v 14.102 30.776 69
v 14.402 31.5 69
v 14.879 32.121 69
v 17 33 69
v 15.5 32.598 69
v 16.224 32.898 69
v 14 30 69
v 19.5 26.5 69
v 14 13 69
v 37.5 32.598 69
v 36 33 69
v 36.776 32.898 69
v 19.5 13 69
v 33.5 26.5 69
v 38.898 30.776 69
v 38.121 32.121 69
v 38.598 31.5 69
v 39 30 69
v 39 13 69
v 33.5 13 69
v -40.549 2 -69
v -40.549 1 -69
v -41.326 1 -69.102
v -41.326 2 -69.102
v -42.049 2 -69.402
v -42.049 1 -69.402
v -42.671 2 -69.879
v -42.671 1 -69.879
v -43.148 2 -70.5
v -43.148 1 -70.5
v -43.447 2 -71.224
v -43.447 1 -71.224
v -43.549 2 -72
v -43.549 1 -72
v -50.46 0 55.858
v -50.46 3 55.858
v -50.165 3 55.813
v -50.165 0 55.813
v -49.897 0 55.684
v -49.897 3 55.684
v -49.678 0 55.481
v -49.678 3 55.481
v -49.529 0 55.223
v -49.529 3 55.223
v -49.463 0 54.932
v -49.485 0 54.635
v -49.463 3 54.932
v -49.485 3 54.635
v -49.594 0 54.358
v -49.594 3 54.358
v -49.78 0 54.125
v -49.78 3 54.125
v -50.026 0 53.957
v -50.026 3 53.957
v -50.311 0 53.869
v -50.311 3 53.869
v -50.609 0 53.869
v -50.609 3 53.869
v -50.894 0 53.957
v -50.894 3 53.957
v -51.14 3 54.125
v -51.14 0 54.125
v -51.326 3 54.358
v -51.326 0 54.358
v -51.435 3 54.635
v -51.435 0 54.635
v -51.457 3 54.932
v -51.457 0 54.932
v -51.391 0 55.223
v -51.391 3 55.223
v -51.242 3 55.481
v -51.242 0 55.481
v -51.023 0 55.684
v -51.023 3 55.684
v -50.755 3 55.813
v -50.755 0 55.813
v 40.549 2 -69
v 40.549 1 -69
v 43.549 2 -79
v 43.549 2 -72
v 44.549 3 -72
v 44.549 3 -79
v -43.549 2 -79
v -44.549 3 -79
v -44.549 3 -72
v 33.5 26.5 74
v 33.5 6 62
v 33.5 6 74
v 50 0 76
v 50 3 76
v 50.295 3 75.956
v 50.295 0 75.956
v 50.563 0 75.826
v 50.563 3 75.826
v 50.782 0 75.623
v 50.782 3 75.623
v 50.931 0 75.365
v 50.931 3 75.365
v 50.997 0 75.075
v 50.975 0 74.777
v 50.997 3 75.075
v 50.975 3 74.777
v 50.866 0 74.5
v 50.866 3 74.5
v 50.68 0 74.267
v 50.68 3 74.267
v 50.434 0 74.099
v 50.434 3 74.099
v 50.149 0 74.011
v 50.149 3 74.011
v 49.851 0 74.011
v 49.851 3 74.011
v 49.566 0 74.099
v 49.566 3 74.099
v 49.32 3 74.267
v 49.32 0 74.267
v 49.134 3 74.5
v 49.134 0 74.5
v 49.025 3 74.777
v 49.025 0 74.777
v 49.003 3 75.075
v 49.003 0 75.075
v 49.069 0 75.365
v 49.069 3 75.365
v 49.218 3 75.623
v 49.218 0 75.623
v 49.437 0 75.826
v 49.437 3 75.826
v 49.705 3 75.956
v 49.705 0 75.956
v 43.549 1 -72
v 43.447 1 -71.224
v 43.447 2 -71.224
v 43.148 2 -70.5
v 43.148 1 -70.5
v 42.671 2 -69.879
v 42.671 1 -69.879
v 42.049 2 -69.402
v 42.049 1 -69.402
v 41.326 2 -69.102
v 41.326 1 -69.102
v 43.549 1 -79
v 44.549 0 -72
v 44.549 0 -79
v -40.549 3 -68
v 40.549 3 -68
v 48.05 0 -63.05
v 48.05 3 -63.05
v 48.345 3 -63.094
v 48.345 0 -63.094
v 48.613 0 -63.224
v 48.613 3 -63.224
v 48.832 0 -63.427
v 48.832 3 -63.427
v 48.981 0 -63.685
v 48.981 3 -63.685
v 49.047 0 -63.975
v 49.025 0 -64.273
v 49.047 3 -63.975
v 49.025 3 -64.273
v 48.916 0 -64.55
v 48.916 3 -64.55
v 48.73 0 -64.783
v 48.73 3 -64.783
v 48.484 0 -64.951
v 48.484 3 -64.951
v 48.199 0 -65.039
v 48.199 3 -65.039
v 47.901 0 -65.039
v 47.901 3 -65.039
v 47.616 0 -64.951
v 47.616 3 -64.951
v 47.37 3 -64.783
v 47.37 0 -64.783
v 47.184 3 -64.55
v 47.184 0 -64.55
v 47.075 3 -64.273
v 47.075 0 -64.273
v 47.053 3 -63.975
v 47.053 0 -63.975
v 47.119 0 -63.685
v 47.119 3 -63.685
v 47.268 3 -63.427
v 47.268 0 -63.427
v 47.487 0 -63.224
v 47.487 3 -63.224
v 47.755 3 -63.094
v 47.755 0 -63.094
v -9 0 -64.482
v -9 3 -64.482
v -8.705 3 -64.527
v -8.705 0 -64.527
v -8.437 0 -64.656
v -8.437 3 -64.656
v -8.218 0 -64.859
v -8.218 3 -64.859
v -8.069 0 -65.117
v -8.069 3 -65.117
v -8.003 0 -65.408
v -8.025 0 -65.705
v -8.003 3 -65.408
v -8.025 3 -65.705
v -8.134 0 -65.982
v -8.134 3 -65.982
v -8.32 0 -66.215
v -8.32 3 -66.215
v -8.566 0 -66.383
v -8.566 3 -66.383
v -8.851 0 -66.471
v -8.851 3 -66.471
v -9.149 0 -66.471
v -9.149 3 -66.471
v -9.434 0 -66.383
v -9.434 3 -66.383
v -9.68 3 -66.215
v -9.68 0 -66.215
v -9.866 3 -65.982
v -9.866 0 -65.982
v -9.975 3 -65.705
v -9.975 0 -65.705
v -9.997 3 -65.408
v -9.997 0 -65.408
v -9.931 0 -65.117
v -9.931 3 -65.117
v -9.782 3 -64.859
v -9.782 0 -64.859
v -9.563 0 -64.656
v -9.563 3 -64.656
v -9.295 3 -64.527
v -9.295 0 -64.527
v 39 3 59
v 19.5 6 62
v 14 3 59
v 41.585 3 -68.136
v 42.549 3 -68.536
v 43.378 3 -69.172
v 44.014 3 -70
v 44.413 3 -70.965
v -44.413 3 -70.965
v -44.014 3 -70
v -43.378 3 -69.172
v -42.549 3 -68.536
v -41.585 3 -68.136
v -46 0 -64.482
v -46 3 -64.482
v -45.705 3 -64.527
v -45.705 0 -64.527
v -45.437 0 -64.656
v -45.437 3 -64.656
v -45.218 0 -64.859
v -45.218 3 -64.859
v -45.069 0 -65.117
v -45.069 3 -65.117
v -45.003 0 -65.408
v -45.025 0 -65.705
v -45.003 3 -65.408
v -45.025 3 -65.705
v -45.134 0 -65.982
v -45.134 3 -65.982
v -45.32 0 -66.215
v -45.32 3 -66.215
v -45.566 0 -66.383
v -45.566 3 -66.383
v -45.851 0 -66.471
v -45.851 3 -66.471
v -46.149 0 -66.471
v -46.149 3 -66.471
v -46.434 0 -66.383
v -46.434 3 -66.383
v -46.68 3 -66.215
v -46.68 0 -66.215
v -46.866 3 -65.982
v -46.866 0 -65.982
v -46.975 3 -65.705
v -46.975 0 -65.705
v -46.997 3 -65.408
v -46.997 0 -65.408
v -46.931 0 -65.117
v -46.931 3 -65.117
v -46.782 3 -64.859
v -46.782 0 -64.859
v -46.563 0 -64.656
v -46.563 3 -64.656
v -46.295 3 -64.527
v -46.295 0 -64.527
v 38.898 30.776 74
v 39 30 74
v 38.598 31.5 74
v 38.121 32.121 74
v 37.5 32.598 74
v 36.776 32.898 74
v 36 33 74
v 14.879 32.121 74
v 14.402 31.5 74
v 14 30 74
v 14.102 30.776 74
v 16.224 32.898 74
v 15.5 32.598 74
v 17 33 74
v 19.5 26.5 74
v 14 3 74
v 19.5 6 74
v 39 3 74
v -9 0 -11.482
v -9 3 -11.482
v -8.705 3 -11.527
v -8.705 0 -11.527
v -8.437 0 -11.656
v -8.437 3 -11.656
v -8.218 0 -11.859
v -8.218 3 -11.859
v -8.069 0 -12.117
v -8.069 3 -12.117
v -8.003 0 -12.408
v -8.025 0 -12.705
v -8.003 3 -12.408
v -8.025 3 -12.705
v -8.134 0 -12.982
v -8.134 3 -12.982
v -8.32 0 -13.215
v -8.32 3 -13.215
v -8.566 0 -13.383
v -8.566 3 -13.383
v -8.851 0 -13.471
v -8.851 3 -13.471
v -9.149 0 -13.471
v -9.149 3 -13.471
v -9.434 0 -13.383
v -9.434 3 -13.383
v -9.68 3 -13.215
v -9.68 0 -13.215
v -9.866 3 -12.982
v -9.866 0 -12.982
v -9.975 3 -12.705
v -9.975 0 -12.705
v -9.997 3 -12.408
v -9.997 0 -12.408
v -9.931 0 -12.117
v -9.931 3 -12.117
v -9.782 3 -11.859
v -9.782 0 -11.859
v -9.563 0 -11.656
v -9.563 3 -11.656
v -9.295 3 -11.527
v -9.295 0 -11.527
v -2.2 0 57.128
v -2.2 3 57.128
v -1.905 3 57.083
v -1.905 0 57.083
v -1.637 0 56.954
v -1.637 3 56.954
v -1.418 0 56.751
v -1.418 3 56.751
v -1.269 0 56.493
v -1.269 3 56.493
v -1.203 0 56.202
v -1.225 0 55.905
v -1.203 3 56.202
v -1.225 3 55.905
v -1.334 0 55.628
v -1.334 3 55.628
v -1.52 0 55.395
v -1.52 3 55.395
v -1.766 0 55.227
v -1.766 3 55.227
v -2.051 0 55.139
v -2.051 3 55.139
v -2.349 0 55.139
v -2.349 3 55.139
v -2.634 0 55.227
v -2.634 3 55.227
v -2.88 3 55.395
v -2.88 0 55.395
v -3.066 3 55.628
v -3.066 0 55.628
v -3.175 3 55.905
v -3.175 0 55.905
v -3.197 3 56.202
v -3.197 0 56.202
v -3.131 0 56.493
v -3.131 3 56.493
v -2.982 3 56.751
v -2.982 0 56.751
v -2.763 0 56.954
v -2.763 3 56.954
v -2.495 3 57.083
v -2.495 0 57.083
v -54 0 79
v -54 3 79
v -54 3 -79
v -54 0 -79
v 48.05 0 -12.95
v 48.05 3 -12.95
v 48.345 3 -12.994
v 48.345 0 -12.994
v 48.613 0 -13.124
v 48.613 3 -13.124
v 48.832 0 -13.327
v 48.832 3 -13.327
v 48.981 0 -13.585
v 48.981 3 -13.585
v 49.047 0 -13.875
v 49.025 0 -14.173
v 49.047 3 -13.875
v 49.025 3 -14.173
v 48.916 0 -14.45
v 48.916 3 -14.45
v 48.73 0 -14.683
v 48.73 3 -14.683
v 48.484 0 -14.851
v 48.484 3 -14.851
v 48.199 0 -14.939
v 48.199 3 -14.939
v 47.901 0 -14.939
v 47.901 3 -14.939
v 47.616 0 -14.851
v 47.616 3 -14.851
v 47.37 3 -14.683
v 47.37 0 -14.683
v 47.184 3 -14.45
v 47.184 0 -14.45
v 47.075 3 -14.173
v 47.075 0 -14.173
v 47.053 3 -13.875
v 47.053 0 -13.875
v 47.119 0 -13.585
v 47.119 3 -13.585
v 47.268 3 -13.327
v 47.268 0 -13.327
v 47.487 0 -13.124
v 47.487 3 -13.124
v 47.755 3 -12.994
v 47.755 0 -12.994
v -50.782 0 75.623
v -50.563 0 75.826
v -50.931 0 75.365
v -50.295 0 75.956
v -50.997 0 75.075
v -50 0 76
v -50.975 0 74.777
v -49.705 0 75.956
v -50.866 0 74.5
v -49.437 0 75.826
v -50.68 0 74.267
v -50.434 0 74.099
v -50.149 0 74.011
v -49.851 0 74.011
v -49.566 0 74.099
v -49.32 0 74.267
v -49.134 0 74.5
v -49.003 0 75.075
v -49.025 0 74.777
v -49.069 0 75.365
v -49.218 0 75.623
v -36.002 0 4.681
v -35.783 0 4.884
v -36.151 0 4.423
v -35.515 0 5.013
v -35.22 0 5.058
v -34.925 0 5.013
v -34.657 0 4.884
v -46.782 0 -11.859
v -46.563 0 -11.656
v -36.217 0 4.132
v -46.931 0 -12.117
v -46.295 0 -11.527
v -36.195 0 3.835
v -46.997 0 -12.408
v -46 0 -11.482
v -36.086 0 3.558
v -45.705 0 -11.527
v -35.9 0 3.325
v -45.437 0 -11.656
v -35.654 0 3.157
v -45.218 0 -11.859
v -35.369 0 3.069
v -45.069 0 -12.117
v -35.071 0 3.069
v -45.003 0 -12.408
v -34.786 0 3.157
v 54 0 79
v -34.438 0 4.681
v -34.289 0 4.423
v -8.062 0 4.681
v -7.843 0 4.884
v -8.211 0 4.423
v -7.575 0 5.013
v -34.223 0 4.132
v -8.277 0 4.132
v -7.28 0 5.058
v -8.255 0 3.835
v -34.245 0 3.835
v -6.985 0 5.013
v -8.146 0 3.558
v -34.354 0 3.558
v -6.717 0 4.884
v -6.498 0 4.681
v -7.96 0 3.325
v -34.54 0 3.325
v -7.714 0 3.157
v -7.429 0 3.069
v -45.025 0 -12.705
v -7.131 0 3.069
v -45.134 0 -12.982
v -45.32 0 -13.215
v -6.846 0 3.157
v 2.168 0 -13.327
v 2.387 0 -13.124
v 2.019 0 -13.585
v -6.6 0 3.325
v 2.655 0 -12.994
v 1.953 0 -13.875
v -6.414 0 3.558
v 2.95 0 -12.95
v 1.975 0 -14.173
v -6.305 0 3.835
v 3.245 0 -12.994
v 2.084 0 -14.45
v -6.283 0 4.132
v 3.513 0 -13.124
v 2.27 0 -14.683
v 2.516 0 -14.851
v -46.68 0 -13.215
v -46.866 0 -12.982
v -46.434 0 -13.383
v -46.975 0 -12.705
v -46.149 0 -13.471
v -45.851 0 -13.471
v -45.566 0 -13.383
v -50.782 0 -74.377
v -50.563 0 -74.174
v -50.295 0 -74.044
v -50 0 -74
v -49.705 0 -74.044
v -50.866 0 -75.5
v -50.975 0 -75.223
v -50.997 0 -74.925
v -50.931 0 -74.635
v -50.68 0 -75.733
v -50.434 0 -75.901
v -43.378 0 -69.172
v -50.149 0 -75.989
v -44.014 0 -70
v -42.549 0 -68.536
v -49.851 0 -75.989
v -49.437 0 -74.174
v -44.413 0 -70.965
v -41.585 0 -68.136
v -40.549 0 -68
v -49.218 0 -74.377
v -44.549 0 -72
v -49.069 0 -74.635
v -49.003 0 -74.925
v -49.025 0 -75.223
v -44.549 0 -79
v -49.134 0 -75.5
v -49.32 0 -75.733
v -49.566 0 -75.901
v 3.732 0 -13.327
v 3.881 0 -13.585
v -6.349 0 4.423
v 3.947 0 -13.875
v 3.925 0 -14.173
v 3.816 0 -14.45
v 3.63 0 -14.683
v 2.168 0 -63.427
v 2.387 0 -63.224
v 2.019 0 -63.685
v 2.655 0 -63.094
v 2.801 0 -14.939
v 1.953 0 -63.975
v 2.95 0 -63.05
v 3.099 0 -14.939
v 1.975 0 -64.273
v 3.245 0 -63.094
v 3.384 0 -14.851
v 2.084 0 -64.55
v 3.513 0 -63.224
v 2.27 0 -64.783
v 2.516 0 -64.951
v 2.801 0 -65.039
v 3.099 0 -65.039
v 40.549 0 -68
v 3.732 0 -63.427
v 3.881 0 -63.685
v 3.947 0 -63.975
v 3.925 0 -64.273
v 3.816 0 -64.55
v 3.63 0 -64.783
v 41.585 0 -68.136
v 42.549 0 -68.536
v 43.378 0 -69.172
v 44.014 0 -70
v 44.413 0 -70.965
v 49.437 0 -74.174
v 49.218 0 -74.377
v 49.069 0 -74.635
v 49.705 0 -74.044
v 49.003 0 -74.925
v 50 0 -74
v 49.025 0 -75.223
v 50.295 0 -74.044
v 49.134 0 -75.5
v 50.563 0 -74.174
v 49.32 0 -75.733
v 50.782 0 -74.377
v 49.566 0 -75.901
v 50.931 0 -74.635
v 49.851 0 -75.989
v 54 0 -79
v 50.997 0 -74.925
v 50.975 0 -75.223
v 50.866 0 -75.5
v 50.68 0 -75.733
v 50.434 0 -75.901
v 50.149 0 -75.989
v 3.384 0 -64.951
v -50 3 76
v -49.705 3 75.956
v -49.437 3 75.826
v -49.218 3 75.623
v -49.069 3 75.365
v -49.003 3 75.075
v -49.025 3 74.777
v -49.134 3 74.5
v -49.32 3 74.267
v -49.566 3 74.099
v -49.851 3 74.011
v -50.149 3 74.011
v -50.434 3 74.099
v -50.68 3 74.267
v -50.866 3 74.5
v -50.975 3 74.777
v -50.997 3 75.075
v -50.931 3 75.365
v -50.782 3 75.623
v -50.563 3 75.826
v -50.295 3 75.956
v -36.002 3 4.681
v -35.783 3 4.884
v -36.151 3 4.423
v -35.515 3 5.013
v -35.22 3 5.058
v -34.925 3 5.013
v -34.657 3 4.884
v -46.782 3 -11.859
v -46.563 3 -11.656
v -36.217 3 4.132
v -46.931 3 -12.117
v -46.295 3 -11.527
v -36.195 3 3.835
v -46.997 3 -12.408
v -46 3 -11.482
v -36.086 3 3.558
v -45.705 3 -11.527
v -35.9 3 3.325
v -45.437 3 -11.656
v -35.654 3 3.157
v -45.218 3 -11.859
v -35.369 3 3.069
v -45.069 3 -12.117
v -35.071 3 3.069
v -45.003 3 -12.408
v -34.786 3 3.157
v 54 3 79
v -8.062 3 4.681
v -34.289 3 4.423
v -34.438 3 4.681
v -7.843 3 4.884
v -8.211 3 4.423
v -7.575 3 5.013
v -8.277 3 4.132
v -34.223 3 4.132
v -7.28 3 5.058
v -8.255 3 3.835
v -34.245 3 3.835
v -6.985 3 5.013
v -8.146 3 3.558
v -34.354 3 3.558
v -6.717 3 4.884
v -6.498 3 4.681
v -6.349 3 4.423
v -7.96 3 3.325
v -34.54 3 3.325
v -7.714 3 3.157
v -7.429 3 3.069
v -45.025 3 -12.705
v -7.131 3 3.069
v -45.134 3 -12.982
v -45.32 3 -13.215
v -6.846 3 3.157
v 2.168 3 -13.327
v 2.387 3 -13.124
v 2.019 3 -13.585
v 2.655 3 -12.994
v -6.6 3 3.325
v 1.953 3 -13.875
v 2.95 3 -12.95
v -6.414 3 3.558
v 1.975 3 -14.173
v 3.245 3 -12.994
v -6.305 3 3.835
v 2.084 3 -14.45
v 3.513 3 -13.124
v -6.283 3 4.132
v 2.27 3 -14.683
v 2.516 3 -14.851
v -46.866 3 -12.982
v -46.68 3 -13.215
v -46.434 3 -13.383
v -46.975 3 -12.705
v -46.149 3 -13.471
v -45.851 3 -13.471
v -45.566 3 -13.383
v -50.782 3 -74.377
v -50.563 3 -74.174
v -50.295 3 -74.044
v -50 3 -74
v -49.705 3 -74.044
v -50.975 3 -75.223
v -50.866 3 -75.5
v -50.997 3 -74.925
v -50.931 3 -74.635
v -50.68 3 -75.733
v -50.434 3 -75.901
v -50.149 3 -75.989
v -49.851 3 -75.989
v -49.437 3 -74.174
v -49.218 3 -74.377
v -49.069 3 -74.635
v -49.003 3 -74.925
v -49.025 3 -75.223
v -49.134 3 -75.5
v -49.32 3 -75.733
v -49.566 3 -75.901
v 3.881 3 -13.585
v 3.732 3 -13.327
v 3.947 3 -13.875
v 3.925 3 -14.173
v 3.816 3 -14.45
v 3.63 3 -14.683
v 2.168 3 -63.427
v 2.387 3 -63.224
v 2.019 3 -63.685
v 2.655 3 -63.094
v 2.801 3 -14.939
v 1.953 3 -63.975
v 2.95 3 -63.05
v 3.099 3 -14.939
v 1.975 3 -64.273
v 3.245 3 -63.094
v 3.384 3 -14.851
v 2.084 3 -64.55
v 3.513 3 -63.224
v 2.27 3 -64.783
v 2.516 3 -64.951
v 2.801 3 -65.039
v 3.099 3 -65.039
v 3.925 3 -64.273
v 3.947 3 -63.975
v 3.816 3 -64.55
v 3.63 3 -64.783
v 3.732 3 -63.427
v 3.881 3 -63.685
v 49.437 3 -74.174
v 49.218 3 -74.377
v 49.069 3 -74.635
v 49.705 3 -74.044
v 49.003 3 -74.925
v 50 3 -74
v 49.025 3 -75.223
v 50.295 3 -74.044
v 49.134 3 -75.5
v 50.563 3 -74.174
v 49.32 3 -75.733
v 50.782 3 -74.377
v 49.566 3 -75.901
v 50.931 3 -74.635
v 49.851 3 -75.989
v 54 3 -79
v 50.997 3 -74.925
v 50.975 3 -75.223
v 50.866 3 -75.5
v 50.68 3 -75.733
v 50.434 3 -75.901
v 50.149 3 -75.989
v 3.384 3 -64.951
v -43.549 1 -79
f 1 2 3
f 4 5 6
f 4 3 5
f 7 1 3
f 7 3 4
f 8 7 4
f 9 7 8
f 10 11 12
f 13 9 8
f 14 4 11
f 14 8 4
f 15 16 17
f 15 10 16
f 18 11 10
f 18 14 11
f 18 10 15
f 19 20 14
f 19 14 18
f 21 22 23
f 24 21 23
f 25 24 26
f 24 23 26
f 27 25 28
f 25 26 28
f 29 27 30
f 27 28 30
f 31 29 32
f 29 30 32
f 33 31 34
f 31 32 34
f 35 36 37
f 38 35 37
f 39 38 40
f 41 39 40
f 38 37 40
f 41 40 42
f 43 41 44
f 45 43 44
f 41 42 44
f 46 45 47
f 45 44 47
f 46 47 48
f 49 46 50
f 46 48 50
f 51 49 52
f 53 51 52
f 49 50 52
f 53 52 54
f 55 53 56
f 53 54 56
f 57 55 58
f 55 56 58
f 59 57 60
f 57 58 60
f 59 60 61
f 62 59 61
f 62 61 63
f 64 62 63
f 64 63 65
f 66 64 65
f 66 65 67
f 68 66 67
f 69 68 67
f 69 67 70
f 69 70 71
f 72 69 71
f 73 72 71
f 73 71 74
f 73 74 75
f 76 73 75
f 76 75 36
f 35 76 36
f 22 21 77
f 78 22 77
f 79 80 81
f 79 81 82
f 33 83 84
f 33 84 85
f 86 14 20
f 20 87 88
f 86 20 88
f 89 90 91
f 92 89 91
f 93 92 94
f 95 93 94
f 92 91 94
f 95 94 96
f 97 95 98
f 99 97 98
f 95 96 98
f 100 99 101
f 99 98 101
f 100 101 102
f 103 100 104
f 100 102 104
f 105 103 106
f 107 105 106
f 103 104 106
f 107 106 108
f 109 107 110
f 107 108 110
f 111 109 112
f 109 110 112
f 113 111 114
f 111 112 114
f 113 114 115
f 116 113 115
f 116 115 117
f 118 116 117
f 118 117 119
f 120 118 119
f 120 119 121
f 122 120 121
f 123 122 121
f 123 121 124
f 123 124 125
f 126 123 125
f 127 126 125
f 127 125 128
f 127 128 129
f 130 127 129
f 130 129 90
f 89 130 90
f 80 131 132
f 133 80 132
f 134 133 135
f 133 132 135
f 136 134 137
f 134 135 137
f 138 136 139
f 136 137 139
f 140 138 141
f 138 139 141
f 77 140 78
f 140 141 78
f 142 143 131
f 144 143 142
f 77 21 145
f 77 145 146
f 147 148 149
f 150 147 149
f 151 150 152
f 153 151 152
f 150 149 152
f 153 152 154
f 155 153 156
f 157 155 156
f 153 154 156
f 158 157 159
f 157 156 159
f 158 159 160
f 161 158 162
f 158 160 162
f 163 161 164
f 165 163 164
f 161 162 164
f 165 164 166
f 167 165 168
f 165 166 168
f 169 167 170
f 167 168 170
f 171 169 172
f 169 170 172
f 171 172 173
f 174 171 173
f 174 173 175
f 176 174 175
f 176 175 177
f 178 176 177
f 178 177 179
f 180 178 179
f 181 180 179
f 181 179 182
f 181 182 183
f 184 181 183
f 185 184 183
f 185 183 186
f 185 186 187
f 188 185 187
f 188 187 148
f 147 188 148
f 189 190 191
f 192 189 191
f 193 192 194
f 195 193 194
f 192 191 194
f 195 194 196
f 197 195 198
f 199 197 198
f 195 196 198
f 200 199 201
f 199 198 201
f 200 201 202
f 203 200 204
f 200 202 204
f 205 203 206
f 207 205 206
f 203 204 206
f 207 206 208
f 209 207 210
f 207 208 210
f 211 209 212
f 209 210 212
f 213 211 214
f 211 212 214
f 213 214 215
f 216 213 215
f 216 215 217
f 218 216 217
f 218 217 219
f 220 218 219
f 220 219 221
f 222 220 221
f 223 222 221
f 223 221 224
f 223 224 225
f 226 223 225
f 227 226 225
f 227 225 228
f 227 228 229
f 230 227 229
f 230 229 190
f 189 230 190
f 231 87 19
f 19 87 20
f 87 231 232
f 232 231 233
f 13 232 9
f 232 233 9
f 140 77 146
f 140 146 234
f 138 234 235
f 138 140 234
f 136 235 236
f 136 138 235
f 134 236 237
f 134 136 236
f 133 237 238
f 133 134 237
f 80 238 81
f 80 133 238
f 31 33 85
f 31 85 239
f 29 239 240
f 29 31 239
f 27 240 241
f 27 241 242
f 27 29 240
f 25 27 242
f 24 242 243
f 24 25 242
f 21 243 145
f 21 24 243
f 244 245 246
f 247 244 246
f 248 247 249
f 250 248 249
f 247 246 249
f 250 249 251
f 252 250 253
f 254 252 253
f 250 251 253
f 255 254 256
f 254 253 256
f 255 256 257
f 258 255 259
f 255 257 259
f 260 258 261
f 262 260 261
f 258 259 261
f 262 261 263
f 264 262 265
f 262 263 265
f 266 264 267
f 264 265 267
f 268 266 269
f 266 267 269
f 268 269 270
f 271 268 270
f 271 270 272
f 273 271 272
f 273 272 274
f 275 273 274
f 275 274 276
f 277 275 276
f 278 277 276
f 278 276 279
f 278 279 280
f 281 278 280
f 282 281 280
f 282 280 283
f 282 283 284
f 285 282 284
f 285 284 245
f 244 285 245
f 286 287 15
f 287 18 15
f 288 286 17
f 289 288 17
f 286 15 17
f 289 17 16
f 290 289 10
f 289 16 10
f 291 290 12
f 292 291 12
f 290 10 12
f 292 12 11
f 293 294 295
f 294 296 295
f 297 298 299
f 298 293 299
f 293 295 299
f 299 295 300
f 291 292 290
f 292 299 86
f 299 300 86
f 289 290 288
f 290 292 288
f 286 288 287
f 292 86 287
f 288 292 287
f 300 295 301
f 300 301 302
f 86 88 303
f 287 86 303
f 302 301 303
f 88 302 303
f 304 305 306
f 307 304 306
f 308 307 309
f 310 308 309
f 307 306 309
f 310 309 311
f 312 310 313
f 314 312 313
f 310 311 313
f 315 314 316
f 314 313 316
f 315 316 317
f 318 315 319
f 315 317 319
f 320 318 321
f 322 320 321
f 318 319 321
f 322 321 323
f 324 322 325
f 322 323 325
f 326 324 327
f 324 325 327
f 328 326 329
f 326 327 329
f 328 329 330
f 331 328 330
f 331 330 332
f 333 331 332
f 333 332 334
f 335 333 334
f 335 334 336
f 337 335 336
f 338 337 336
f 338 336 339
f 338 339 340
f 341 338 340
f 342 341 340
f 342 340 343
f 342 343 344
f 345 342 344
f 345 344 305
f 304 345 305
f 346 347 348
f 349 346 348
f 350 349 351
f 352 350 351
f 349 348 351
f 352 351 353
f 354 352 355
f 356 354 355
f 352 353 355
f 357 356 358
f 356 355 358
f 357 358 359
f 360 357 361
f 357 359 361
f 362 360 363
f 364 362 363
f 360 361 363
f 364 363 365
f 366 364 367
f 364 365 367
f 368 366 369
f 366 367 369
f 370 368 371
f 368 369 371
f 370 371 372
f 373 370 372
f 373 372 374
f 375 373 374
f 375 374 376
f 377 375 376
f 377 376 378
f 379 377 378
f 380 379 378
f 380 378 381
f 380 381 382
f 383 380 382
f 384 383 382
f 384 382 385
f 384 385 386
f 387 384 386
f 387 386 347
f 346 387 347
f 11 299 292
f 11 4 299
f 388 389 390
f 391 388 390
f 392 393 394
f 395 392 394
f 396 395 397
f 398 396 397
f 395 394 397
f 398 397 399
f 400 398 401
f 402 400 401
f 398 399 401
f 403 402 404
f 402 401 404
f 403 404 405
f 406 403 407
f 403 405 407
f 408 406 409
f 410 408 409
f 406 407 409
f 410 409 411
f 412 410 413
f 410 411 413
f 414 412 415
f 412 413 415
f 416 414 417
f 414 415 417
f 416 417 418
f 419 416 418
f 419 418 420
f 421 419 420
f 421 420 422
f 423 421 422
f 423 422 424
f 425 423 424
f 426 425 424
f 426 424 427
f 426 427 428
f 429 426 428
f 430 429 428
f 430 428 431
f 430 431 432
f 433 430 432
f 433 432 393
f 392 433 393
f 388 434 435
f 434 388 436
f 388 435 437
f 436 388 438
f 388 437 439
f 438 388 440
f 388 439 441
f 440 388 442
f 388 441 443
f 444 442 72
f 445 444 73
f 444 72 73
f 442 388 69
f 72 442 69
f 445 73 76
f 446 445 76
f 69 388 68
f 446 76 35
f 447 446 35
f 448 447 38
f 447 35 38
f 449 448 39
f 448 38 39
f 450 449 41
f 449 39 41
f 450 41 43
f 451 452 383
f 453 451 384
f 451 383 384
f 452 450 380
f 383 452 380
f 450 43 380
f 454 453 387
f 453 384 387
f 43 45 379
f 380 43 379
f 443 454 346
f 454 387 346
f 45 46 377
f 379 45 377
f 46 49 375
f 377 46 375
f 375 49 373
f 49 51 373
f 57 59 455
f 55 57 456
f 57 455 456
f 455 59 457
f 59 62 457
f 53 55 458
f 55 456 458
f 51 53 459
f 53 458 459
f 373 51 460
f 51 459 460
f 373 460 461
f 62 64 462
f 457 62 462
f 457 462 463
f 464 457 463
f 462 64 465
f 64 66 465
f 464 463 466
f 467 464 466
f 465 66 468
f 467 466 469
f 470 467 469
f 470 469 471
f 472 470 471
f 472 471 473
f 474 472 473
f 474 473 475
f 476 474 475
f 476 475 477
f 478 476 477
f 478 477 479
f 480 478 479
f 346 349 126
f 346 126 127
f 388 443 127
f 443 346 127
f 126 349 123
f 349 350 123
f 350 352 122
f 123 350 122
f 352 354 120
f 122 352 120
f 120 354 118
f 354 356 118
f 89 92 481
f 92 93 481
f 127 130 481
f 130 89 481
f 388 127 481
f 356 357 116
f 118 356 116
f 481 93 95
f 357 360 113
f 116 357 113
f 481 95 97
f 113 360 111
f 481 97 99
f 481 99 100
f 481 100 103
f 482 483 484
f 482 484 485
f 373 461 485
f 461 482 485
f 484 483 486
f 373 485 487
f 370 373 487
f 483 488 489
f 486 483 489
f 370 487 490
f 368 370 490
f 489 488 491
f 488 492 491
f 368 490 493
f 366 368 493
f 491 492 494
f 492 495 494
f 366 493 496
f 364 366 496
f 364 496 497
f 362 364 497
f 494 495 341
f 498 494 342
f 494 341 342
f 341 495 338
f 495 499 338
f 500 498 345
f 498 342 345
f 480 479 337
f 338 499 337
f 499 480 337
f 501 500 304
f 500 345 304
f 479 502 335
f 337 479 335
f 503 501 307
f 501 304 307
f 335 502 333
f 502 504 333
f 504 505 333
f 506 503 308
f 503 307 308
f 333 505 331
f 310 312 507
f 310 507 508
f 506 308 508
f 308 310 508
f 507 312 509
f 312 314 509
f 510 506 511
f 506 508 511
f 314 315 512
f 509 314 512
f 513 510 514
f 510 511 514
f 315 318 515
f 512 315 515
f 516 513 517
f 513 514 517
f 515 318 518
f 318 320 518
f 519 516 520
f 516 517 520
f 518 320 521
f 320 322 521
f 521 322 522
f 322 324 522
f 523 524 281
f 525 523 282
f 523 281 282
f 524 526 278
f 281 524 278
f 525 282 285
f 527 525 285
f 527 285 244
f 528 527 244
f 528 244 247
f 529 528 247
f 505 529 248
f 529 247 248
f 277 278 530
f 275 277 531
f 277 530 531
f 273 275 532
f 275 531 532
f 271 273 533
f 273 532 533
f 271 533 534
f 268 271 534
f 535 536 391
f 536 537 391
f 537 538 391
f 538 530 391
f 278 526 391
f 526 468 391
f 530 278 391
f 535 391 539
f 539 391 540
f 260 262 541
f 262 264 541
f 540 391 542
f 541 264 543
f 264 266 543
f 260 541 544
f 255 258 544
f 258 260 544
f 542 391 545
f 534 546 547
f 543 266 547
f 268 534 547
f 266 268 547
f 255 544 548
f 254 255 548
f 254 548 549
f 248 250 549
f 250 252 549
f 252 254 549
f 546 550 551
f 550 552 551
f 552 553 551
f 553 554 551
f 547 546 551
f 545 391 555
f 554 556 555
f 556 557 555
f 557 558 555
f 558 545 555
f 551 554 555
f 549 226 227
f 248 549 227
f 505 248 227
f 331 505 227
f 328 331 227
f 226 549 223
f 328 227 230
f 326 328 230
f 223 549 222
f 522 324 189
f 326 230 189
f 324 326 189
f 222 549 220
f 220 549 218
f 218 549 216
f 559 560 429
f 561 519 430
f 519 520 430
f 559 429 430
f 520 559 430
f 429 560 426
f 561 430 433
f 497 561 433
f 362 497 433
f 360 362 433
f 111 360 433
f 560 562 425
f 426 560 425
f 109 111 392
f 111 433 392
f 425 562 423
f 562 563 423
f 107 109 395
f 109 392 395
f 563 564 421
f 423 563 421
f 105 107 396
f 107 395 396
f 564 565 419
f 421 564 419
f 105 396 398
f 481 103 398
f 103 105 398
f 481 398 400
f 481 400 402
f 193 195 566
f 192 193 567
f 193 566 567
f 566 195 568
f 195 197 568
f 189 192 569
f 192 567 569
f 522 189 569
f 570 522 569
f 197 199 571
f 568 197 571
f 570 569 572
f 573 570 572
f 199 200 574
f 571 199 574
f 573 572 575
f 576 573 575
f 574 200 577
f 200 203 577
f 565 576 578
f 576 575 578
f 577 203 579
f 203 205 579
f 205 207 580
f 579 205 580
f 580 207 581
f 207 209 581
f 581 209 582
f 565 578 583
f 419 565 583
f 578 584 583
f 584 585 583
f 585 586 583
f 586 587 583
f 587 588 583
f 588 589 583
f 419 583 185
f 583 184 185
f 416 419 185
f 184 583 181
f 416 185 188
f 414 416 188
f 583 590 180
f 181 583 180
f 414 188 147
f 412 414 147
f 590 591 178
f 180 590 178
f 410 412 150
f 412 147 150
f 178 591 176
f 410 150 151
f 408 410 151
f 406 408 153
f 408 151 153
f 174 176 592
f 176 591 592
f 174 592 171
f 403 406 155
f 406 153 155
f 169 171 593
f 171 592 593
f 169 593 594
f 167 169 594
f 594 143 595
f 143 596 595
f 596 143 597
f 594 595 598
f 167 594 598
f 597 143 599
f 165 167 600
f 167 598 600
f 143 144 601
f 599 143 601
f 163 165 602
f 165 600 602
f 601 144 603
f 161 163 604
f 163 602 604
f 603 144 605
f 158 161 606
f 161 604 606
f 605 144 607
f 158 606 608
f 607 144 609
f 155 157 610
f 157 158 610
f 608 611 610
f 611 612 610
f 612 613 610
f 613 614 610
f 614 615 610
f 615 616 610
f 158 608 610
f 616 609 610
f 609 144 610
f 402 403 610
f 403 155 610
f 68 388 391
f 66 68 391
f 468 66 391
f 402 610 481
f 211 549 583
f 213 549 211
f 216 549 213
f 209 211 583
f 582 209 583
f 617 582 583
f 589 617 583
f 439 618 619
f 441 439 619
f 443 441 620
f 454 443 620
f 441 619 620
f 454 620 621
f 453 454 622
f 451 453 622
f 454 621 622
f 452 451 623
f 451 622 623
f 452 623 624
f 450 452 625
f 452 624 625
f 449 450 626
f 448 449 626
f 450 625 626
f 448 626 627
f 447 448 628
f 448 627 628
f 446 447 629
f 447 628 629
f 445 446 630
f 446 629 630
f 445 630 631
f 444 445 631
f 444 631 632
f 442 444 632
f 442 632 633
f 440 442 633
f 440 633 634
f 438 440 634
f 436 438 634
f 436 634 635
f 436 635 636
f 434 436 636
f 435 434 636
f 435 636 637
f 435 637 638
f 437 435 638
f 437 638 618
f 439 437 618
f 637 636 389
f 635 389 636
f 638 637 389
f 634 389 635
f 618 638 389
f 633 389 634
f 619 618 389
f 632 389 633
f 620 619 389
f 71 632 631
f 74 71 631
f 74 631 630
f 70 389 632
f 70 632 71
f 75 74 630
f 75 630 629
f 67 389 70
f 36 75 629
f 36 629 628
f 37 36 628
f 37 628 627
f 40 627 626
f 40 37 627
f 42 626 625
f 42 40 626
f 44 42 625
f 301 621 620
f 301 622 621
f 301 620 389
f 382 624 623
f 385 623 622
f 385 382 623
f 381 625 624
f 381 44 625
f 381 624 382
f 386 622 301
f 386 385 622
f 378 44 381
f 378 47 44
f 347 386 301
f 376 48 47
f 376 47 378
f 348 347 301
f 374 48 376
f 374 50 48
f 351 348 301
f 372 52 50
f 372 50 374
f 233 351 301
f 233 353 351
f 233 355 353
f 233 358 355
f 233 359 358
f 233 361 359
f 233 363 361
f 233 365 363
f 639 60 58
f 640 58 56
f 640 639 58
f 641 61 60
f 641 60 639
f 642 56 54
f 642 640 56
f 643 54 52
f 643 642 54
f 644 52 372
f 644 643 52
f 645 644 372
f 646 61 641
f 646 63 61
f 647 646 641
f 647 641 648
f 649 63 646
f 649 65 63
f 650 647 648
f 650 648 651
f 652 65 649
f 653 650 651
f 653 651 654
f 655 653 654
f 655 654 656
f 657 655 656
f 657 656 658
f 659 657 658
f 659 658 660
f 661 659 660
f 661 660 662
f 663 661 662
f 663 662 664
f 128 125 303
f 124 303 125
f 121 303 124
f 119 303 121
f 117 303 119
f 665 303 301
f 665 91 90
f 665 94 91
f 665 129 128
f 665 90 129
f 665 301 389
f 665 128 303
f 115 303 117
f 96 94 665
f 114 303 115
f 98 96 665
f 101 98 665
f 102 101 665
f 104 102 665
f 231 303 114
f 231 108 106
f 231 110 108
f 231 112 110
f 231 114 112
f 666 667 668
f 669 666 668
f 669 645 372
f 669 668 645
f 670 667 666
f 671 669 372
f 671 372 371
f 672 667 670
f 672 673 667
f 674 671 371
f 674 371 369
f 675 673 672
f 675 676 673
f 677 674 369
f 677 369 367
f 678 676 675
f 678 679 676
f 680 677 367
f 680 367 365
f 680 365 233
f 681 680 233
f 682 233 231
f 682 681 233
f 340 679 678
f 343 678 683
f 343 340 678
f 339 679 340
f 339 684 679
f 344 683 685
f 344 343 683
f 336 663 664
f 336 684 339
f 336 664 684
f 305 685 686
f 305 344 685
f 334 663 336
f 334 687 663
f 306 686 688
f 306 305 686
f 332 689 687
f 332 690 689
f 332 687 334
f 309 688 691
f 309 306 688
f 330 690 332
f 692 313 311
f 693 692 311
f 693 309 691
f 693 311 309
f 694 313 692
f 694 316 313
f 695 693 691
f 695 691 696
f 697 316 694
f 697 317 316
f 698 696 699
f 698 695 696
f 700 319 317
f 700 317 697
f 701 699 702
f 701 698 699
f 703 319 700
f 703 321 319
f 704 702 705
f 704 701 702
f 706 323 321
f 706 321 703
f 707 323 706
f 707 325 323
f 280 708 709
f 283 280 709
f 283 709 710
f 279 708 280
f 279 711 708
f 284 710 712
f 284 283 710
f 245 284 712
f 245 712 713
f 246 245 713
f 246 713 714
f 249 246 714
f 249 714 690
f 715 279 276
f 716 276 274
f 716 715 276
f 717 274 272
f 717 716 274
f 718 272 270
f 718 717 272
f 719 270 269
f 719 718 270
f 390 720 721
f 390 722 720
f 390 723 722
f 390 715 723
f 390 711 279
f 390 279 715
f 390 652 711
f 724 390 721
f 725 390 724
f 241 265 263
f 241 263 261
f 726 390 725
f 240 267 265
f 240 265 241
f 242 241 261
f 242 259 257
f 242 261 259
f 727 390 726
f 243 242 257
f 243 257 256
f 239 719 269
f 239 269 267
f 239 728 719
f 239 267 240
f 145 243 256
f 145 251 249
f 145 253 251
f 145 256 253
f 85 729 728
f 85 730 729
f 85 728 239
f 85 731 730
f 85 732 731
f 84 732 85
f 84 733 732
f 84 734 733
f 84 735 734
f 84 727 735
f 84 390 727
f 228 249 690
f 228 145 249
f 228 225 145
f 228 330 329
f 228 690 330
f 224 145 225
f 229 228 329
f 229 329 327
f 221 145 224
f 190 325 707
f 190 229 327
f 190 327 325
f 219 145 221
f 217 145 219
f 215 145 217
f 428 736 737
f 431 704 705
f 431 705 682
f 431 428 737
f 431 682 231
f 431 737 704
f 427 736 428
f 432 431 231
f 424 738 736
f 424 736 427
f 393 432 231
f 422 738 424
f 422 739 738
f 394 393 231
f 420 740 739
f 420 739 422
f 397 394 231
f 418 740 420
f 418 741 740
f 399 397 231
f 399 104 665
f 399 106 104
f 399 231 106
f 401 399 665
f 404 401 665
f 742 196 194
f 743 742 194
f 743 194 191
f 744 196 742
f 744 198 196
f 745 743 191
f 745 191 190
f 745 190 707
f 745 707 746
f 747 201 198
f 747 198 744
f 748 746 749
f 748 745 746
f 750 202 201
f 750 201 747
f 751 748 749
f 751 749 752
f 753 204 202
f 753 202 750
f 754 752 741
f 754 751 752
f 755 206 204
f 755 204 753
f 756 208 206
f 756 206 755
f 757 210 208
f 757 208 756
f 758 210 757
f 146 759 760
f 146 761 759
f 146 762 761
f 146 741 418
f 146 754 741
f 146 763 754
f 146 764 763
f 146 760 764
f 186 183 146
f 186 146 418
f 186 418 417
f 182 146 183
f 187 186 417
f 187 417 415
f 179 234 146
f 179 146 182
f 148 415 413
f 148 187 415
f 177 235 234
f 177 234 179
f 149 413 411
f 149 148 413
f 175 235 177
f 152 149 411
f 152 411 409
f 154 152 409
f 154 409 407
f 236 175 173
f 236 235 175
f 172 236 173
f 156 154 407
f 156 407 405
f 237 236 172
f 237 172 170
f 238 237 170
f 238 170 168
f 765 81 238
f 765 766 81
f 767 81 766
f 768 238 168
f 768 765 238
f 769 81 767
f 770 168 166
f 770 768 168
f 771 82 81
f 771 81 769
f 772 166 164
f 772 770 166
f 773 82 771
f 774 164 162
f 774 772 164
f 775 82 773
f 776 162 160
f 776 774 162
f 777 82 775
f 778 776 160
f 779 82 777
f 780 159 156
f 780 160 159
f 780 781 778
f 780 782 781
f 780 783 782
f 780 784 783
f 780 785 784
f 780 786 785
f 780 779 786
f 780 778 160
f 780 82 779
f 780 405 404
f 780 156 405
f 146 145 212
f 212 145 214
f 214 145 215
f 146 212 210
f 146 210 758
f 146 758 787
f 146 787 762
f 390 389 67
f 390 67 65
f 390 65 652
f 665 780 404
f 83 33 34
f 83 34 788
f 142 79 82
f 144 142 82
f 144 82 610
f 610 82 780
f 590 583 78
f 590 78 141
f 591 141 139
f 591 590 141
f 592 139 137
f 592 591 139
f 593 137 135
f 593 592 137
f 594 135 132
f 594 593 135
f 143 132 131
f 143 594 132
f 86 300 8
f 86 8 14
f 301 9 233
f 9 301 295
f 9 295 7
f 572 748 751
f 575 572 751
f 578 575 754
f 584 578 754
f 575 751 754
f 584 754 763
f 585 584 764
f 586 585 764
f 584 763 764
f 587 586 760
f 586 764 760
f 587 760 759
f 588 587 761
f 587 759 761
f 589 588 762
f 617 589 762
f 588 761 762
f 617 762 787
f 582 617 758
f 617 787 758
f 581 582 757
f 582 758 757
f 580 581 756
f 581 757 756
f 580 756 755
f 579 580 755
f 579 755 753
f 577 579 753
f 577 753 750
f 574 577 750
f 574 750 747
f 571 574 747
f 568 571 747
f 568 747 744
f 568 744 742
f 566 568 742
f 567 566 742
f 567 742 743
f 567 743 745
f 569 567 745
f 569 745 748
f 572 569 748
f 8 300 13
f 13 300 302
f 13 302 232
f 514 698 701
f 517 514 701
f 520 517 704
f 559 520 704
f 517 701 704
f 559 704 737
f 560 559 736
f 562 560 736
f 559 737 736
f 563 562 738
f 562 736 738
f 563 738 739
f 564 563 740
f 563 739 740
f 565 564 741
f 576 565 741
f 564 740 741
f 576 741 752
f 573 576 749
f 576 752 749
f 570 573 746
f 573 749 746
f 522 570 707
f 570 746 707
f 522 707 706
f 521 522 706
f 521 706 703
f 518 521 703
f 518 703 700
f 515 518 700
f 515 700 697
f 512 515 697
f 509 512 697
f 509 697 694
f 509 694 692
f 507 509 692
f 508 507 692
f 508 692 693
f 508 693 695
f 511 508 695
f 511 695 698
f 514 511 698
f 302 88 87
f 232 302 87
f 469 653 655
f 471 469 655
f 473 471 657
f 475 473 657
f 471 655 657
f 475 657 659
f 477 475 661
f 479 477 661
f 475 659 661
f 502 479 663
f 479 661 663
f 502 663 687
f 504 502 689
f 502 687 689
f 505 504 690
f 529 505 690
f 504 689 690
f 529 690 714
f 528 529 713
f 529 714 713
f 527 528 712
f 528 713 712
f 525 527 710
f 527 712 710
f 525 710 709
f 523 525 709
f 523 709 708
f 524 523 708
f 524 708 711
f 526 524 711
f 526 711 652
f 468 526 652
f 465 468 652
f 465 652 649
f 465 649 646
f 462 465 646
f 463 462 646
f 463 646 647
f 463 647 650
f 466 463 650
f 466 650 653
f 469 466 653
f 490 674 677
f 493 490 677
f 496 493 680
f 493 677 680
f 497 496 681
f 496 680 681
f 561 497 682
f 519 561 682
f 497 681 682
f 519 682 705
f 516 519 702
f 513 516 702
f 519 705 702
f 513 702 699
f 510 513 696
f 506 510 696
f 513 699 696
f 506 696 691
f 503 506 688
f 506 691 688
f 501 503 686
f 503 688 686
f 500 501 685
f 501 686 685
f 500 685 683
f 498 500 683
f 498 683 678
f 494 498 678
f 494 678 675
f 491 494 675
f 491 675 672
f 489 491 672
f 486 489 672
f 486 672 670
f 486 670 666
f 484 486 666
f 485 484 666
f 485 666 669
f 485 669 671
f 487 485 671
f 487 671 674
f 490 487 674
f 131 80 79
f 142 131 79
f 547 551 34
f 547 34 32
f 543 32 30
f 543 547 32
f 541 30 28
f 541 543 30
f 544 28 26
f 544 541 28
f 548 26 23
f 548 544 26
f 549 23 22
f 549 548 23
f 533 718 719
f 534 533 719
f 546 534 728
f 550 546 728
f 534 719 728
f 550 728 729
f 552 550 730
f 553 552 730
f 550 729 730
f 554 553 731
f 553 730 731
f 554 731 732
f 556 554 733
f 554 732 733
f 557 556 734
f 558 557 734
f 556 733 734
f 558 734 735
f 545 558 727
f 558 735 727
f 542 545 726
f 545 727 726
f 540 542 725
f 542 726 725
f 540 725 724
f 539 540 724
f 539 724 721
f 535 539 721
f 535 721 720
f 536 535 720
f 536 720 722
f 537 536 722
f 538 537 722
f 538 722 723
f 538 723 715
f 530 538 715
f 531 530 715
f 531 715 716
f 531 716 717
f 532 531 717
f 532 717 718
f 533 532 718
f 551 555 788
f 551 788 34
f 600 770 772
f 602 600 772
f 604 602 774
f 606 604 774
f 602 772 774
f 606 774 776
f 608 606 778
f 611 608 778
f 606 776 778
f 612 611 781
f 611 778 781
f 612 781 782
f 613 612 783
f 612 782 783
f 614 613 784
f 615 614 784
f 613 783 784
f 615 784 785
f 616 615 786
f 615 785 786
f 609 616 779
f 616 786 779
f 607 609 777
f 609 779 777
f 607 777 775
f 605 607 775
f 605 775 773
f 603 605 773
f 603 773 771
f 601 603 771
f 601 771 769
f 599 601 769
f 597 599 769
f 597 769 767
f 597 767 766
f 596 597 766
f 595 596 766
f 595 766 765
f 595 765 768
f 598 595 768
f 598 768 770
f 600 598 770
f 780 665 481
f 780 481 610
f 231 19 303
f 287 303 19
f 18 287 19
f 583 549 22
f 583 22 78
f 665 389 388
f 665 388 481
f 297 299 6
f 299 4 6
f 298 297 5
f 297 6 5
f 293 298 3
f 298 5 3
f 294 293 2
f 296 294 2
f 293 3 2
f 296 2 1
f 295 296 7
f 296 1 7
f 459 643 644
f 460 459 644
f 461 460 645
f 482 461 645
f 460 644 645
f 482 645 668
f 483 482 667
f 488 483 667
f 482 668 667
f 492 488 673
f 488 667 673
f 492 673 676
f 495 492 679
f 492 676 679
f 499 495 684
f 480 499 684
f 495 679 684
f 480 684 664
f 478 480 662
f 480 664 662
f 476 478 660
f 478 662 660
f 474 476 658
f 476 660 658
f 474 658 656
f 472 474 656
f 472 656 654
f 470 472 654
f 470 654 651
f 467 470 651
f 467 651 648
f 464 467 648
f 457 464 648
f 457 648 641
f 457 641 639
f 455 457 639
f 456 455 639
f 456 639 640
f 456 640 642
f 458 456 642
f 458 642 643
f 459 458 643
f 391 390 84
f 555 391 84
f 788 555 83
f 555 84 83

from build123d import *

# Parameters (mm, degrees)
ESBO_O1_W                = 110
ESBO_O1_H                = 160
RESSALTO_EXTRUS_O1_DEPTH = 3
ESBO_O3_W                = 110
ESBO_O3_H                = 160
ESBO_O3_W_2              = 108
ESBO_O3_H_2              = 158
ESBO_O3_R                = 1
CORTE_EXTRUS_O1_DEPTH    = 98.128780493
ESBO_O5_W                = 87.098953266
ESBO_O5_H                = 10
CORTE_EXTRUS_O2_DEPTH    = 96.739229159
ESBO_O6_W                = 25
ESBO_O6_H                = 5
RESSALTO_EXTRUS_O2_DEPTH = 30
ESBO_O7_W                = 14
ESBO_O7_H                = 20.5
CORTE_EXTRUS_O3_DEPTH    = 171.202820188
ESBO_O8_R                = 1
CORTE_EXTRUS_O4_DEPTH    = 101.284595028
CHANFRO1_SIZE            = 10
FILETE1_R                = 3
FILETE2_R                = 3
CHANFRO2_SIZE            = 1


with BuildPart() as part:
    # Esboço1 → Ressalto-extrusão1 (new body)
    with BuildSketch(Plane(origin=(0, 0, 0), x_dir=(1, 0, 0), z_dir=(0, 1, 0))):
        Rectangle(ESBO_O1_W, ESBO_O1_H)
    extrude(amount=RESSALTO_EXTRUS_O1_DEPTH)

    # Esboço3 → Corte-extrusão1 (cut, through all)
    # profile 1 of 5: a face of its own
    with BuildSketch(Plane(origin=(0, 3, 0), x_dir=(1, 0, 0), z_dir=(0, 1, 0))):
        Rectangle(ESBO_O3_W, ESBO_O3_H)
        Rectangle(ESBO_O3_W_2, ESBO_O3_H_2, mode=Mode.SUBTRACT)
    # profile 2 of 5: a face of its own
    with BuildSketch(Plane(origin=(0, 3, 0), x_dir=(1, 0, 0), z_dir=(0, 1, 0))):
        with Locations(Location((-50, -75, 0), (0, 0, 270))):
            Circle(ESBO_O3_R)
    # profile 3 of 5: a face of its own
    with BuildSketch(Plane(origin=(0, 3, 0), x_dir=(1, 0, 0), z_dir=(0, 1, 0))):
        with Locations(Location((50, -75, 0), (0, 0, 270))):
            Circle(ESBO_O3_R)
    # profile 4 of 5: a face of its own
    with BuildSketch(Plane(origin=(0, 3, 0), x_dir=(1, 0, 0), z_dir=(0, 1, 0))):
        with Locations(Location((50, 75, 0), (0, 0, 270))):
            Circle(ESBO_O3_R)
    # profile 5 of 5: a face of its own
    with BuildSketch(Plane(origin=(0, 3, 0), x_dir=(1, 0, 0), z_dir=(0, 1, 0))):
        with Locations(Location((-50, 75, 0), (0, 0, 270))):
            Circle(ESBO_O3_R)
    extrude(amount=-CORTE_EXTRUS_O1_DEPTH, mode=Mode.SUBTRACT)

    # Esboço5 → Corte-extrusão2 (cut, through all)
    with BuildSketch(Plane(origin=(0, 3, 0), x_dir=(1, 0, 0), z_dir=(0, 1, 0))):
        with Locations((0, 74)):
            Rectangle(ESBO_O5_W, ESBO_O5_H)
    extrude(amount=-CORTE_EXTRUS_O2_DEPTH, mode=Mode.SUBTRACT)

    # Esboço6 → Ressalto-extrusão2 (add)
    with BuildSketch(Plane(origin=(0, 3, 0), x_dir=(1, 0, 0), z_dir=(0, 1, 0))):
        with Locations((26.5, -71.5)):
            Rectangle(ESBO_O6_W, ESBO_O6_H)
    extrude(amount=RESSALTO_EXTRUS_O2_DEPTH)

    # Esboço7 → Corte-extrusão3 (cut, through all)
    with BuildSketch(Plane.XY.offset(79)):
        with Locations((26.5, 16.25)):
            Rectangle(ESBO_O7_W, ESBO_O7_H)
    extrude(amount=-CORTE_EXTRUS_O3_DEPTH, mode=Mode.SUBTRACT)

    # Esboço8 → Corte-extrusão4 (cut, through all)
    with BuildSketch(Plane(origin=(0, 3, 0), x_dir=(1, 0, 0), z_dir=(0, 1, 0))):
        with Locations(Location((-50.46, -54.857726713, 0), (0, 0, 270))):
            Circle(ESBO_O8_R)
        with Locations(Location((-2.2, -56.127726713, 0), (0, 0, 270))):
            Circle(ESBO_O8_R)
        with Locations(Location((-7.28, -4.057726713, 0), (0, 0, 270))):
            Circle(ESBO_O8_R)
        with Locations(Location((-35.22, -4.057726713, 0), (0, 0, 270))):
            Circle(ESBO_O8_R)
        with Locations(Location((48.05, 13.95, 0), (0, 0, 270))):
            Circle(ESBO_O8_R)
        with Locations(Location((2.95, 13.95, 0), (0, 0, 270))):
            Circle(ESBO_O8_R)
        with Locations(Location((-9, 12.482273287, 0), (0, 0, 270))):
            Circle(ESBO_O8_R)
        with Locations(Location((-46, 12.482273287, 0), (0, 0, 270))):
            Circle(ESBO_O8_R)
        with Locations(Location((48.05, 64.05, 0), (0, 0, 270))):
            Circle(ESBO_O8_R)
        with Locations(Location((2.95, 64.05, 0), (0, 0, 270))):
            Circle(ESBO_O8_R)
        with Locations(Location((-9, 65.482273287, 0), (0, 0, 270))):
            Circle(ESBO_O8_R)
        with Locations(Location((-46, 65.482273287, 0), (0, 0, 270))):
            Circle(ESBO_O8_R)
    extrude(amount=-CORTE_EXTRUS_O4_DEPTH, mode=Mode.SUBTRACT)

    # Chanfro1
    # the kernel refuses this chamfer: 10 mm, written as the material it adds along each edge
    with BuildSketch(Plane(origin=(14, 3, 69), x_dir=(0, -0.02749587661058636, -0.9996219169112968), z_dir=(1, 0, 0))) as chanfro1_piece_1_section:
        Polygon((CHANFRO1_SIZE * 0.999621916911, CHANFRO1_SIZE * 0.0274958766106), (-CHANFRO1_SIZE * 0.0274958766106, CHANFRO1_SIZE * 0.999621916911), (0, 0), align=None)
    chanfro1_piece_1 = extrude(amount=25, mode=Mode.PRIVATE)
    chanfro1_piece_1 = split(chanfro1_piece_1, bisect_by=Plane(origin=(16.75, 6, 64.635027274), z_dir=(0, -1, 0)), keep=Keep.TOP, mode=Mode.PRIVATE)
    chanfro1_piece_1 = split(chanfro1_piece_1, bisect_by=Plane(origin=(19.5, 4.275363385, 64.635027274), z_dir=(-1, 0, 0)), keep=Keep.TOP, mode=Mode.PRIVATE)
    add(chanfro1_piece_1)
    with BuildSketch(Plane(origin=(14, 3, 69), x_dir=(0, -0.02749587661058636, -0.9996219169112968), z_dir=(1, 0, 0))) as chanfro1_piece_2_section:
        Polygon((CHANFRO1_SIZE * 0.999621916911, CHANFRO1_SIZE * 0.0274958766106), (-CHANFRO1_SIZE * 0.0274958766106, CHANFRO1_SIZE * 0.999621916911), (0, 0), align=None)
    chanfro1_piece_2 = extrude(amount=25, mode=Mode.PRIVATE)
    chanfro1_piece_2 = split(chanfro1_piece_2, bisect_by=Plane(origin=(16.75, 6, 66.852482787), z_dir=(0, 1, 0)), keep=Keep.TOP, mode=Mode.PRIVATE)
    chanfro1_piece_2 = split(chanfro1_piece_2, bisect_by=Plane(origin=(19.5, 8.478561277, 66.852482787), z_dir=(-1, 0, 0)), keep=Keep.TOP, mode=Mode.PRIVATE)
    add(chanfro1_piece_2)
    with BuildSketch(Plane(origin=(14, 3, 69), x_dir=(0, -0.02749587661058636, -0.9996219169112968), z_dir=(1, 0, 0))) as chanfro1_piece_3_section:
        Polygon((CHANFRO1_SIZE * 0.999621916911, CHANFRO1_SIZE * 0.0274958766106), (-CHANFRO1_SIZE * 0.0274958766106, CHANFRO1_SIZE * 0.999621916911), (0, 0), align=None)
    chanfro1_piece_3 = extrude(amount=25, mode=Mode.PRIVATE)
    chanfro1_piece_3 = split(chanfro1_piece_3, bisect_by=Plane(origin=(33.5, 4.275363385, 64.635027274), z_dir=(-1, 0, 0)), keep=Keep.TOP, mode=Mode.PRIVATE)
    chanfro1_piece_3 = split(chanfro1_piece_3, bisect_by=Plane(origin=(26.5, 6, 64.635027274), z_dir=(0, -1, 0)), keep=Keep.TOP, mode=Mode.PRIVATE)
    chanfro1_piece_3 = split(chanfro1_piece_3, bisect_by=Plane(origin=(19.5, 4.275363385, 64.635027274), z_dir=(1, 0, 0)), keep=Keep.TOP, mode=Mode.PRIVATE)
    add(chanfro1_piece_3)
    with BuildSketch(Plane(origin=(14, 3, 69), x_dir=(0, -0.02749587661058636, -0.9996219169112968), z_dir=(1, 0, 0))) as chanfro1_piece_4_section:
        Polygon((CHANFRO1_SIZE * 0.999621916911, CHANFRO1_SIZE * 0.0274958766106), (-CHANFRO1_SIZE * 0.0274958766106, CHANFRO1_SIZE * 0.999621916911), (0, 0), align=None)
    chanfro1_piece_4 = extrude(amount=25, mode=Mode.PRIVATE)
    chanfro1_piece_4 = split(chanfro1_piece_4, bisect_by=Plane(origin=(33.5, 4.275363385, 64.635027274), z_dir=(1, 0, 0)), keep=Keep.TOP, mode=Mode.PRIVATE)
    chanfro1_piece_4 = split(chanfro1_piece_4, bisect_by=Plane(origin=(36.25, 6, 64.635027274), z_dir=(0, -1, 0)), keep=Keep.TOP, mode=Mode.PRIVATE)
    add(chanfro1_piece_4)
    with BuildSketch(Plane(origin=(14, 3, 69), x_dir=(0, -0.02749587661058636, -0.9996219169112968), z_dir=(1, 0, 0))) as chanfro1_piece_5_section:
        Polygon((CHANFRO1_SIZE * 0.999621916911, CHANFRO1_SIZE * 0.0274958766106), (-CHANFRO1_SIZE * 0.0274958766106, CHANFRO1_SIZE * 0.999621916911), (0, 0), align=None)
    chanfro1_piece_5 = extrude(amount=25, mode=Mode.PRIVATE)
    chanfro1_piece_5 = split(chanfro1_piece_5, bisect_by=Plane(origin=(33.5, 8.478561277, 66.852482787), z_dir=(1, 0, 0)), keep=Keep.TOP, mode=Mode.PRIVATE)
    chanfro1_piece_5 = split(chanfro1_piece_5, bisect_by=Plane(origin=(36.25, 6, 66.852482787), z_dir=(0, 1, 0)), keep=Keep.TOP, mode=Mode.PRIVATE)
    add(chanfro1_piece_5)

    # Filete1
    filete1_edges = [part.edges().sort_by_distance(p)[0] for p in [
        (39, 33, 71.5),
        (14, 33, 71.5),
    ]]
    fillet(filete1_edges, radius=FILETE1_R)

    # Filete2
    filete2_edges = [part.edges().sort_by_distance(p)[0] for p in [
        (-43.549476633, 1.5, -69),
        (43.549476633, 1.5, -69),
    ]]
    fillet(filete2_edges, radius=FILETE2_R)

    # Chanfro2
    chanfro2_edges = [part.edges().sort_by_distance(p)[0] for p in [
        (43.549476633, 3, -75.5),
        (43.549476633, 0, -75.5),
        (0, 3, -69),
        (0, 0, -69),
        (42.670796977, 3, -69.878679656),
        (42.670796977, 0, -69.878679656),
        (-42.670796977, 3, -69.878679656),
        (-42.670796977, 0, -69.878679656),
        (-43.549476633, 0, -75.5),
        (-43.549476633, 3, -75.5),
    ]]
    chamfer(chanfro2_edges, length=CHANFRO2_SIZE)


solid = part.part
